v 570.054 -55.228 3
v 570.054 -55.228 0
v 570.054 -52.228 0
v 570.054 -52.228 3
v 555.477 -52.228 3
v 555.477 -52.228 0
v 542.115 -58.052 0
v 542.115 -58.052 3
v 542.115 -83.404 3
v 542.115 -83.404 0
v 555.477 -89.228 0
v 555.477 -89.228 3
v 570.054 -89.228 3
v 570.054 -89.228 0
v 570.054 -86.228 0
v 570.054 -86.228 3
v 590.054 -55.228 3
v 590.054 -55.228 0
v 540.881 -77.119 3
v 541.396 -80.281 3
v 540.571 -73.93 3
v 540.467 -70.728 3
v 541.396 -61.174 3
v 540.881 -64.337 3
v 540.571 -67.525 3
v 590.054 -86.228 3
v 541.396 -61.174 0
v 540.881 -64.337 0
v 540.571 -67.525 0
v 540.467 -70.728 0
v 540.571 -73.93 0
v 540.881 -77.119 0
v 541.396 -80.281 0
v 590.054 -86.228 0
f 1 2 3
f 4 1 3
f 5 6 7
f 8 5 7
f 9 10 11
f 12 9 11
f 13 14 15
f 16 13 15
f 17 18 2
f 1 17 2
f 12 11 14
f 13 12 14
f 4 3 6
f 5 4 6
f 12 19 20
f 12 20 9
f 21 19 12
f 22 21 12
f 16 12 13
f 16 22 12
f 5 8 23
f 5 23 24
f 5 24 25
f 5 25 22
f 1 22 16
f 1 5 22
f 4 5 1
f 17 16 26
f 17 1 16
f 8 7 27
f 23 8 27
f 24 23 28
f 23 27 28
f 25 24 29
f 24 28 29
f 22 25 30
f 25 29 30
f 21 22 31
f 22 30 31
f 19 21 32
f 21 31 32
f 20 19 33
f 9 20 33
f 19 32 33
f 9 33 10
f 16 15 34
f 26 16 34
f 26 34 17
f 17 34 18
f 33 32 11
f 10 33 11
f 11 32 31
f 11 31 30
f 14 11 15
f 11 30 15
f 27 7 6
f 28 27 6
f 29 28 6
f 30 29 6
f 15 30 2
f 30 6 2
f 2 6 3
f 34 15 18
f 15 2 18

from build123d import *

# Parameters (mm, degrees)
BASE_EXTRUDE_DEPTH = 3


with BuildPart() as part:
    # Sketch1 → Base-Extrude (new body)
    with BuildSketch(Plane.XY):
        with BuildLine():
            Line((570.053994223, -52.227879558), (555.477414106, -52.227879558))
            Line((555.477414106, -52.227879558), (542.114900608, -58.051960683))
            ThreePointArc((542.114900608, -58.051960683), (540.467412221, -70.727788214), (542.114985017, -83.403604775))
            Line((542.114985017, -83.403604775), (555.477414106, -89.227879558))
            Line((555.477414106, -89.227879558), (570.053994223, -89.227879558))
            Line((570.053994223, -89.227879558), (570.053994223, -86.227879558))
            Line((570.053994223, -86.227879558), (590.053994223, -86.227879558))
            Line((590.053994223, -86.227879558), (590.053994223, -70.727623116))
            Line((590.053994223, -70.727623116), (590.053994223, -55.227879558))
            Line((590.053994223, -55.227879558), (570.053994223, -55.227879558))
            Line((570.053994223, -55.227879558), (570.053994223, -52.227879558))
        make_face()
    extrude(amount=BASE_EXTRUDE_DEPTH)


solid = part.part
